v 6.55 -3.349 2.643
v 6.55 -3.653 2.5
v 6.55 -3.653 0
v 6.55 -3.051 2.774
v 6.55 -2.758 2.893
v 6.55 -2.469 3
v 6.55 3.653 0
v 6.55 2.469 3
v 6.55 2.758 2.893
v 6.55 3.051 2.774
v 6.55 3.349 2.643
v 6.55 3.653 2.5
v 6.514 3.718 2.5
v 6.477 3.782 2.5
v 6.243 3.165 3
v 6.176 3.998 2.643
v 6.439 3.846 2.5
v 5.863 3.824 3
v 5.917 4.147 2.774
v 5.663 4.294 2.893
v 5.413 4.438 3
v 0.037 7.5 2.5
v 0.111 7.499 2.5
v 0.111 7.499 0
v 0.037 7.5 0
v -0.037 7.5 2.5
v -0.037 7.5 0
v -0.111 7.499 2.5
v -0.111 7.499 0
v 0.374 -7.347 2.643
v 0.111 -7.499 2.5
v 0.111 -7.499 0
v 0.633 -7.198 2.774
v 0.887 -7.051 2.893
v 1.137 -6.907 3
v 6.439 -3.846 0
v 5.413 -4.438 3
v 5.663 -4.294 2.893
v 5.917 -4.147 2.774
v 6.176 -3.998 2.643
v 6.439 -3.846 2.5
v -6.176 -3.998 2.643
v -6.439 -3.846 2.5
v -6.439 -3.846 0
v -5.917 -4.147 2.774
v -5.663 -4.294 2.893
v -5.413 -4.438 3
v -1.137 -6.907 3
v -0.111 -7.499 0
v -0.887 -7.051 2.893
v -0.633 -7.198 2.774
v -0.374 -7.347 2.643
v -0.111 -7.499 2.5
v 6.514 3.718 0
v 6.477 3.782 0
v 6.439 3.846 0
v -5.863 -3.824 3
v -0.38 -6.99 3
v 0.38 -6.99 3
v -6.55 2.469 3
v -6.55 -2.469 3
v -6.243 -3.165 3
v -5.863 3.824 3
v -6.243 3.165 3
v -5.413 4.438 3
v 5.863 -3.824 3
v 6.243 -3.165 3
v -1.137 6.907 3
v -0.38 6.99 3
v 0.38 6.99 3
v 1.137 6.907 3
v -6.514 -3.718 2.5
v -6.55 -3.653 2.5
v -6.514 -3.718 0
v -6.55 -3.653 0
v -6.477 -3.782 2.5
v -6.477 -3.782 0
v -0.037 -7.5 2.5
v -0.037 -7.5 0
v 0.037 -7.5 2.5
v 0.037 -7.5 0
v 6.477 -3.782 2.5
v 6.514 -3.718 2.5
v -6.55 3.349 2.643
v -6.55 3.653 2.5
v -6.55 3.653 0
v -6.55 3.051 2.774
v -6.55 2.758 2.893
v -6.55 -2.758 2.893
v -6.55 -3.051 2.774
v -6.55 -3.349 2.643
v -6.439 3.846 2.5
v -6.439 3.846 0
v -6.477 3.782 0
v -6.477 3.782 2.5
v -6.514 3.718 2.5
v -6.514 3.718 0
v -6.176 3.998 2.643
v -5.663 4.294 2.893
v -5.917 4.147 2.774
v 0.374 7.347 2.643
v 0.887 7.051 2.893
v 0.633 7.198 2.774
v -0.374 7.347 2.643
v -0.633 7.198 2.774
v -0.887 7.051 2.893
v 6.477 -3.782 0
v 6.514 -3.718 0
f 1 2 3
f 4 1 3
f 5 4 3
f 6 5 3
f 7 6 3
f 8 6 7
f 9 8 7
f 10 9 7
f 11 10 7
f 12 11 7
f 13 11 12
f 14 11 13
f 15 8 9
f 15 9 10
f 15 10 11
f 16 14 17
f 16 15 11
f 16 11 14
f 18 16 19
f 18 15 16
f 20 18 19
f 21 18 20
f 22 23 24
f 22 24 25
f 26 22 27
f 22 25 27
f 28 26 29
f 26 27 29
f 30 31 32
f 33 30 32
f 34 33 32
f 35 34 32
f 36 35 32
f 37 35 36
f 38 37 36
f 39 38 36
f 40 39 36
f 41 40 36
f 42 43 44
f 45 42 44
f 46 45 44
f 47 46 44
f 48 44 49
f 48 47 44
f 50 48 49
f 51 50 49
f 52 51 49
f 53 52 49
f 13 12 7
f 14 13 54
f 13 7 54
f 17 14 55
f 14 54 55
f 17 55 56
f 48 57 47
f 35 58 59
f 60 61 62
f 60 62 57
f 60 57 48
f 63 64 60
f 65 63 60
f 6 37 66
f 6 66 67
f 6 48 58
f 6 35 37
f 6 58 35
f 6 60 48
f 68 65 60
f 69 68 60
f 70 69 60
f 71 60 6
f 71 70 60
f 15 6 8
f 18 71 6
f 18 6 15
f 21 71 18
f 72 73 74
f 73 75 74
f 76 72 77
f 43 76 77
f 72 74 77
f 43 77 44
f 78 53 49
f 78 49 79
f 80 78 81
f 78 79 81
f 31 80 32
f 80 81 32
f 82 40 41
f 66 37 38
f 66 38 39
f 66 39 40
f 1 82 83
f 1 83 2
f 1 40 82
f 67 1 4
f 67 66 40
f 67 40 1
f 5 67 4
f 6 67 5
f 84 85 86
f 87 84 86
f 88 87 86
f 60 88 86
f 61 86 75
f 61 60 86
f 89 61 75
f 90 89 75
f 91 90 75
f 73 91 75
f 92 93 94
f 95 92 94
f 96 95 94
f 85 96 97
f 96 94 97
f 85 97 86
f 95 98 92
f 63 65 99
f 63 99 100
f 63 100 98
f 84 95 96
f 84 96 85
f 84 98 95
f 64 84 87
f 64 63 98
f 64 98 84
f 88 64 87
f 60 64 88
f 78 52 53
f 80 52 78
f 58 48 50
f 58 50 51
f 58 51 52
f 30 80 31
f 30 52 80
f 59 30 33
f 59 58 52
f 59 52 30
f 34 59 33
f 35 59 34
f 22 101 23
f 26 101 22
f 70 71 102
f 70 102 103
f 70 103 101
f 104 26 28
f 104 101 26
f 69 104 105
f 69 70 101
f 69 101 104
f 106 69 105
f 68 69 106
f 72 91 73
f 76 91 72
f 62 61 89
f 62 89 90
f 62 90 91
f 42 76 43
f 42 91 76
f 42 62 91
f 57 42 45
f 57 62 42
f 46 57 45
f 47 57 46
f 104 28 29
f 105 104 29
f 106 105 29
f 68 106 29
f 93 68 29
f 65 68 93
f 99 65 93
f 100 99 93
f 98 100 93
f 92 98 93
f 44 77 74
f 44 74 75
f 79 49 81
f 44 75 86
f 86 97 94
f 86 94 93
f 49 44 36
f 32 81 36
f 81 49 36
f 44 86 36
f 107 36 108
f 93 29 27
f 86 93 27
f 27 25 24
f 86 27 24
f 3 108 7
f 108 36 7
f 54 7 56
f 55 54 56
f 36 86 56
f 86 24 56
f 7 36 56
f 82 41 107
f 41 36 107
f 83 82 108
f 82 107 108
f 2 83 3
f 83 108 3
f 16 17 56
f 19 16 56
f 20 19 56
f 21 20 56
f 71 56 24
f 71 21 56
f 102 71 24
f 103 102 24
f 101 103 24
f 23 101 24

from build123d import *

# Parameters (mm, degrees)
SKETCH003_R      = 7.5
PAD003_DEPTH     = 3
CHAMFER_SIZE     = 0.5
EXTRUDE001_DEPTH = 3


with BuildPart() as chamfer_body:
    # Sketch003 → Pad003 (new body)
    with BuildSketch(Plane.XY):
        Circle(SKETCH003_R)
    extrude(amount=PAD003_DEPTH)

    # Chamfer
    chamfer_edges = [chamfer_body.edges().sort_by_distance(p)[0] for p in [
        (-7.5, 0, 3),
    ]]
    chamfer(chamfer_edges, length=CHAMFER_SIZE)


with BuildPart() as common:
    # Sketch005 (on Face3 of Pad003) → Extrude001 (new body)
    with BuildSketch(Plane.XY.offset(3)):
        Polygon((6.55, -3.781644), (6.55, 3.781644), (0, 7.563289), (-6.55, 3.781644), (-6.55, -3.781644), (0, -7.563289), align=None)
    extrude(amount=-EXTRUDE001_DEPTH)

    # Common: intersect Chamfer body
    add(chamfer_body.part, mode=Mode.INTERSECT)


solid = common.part
